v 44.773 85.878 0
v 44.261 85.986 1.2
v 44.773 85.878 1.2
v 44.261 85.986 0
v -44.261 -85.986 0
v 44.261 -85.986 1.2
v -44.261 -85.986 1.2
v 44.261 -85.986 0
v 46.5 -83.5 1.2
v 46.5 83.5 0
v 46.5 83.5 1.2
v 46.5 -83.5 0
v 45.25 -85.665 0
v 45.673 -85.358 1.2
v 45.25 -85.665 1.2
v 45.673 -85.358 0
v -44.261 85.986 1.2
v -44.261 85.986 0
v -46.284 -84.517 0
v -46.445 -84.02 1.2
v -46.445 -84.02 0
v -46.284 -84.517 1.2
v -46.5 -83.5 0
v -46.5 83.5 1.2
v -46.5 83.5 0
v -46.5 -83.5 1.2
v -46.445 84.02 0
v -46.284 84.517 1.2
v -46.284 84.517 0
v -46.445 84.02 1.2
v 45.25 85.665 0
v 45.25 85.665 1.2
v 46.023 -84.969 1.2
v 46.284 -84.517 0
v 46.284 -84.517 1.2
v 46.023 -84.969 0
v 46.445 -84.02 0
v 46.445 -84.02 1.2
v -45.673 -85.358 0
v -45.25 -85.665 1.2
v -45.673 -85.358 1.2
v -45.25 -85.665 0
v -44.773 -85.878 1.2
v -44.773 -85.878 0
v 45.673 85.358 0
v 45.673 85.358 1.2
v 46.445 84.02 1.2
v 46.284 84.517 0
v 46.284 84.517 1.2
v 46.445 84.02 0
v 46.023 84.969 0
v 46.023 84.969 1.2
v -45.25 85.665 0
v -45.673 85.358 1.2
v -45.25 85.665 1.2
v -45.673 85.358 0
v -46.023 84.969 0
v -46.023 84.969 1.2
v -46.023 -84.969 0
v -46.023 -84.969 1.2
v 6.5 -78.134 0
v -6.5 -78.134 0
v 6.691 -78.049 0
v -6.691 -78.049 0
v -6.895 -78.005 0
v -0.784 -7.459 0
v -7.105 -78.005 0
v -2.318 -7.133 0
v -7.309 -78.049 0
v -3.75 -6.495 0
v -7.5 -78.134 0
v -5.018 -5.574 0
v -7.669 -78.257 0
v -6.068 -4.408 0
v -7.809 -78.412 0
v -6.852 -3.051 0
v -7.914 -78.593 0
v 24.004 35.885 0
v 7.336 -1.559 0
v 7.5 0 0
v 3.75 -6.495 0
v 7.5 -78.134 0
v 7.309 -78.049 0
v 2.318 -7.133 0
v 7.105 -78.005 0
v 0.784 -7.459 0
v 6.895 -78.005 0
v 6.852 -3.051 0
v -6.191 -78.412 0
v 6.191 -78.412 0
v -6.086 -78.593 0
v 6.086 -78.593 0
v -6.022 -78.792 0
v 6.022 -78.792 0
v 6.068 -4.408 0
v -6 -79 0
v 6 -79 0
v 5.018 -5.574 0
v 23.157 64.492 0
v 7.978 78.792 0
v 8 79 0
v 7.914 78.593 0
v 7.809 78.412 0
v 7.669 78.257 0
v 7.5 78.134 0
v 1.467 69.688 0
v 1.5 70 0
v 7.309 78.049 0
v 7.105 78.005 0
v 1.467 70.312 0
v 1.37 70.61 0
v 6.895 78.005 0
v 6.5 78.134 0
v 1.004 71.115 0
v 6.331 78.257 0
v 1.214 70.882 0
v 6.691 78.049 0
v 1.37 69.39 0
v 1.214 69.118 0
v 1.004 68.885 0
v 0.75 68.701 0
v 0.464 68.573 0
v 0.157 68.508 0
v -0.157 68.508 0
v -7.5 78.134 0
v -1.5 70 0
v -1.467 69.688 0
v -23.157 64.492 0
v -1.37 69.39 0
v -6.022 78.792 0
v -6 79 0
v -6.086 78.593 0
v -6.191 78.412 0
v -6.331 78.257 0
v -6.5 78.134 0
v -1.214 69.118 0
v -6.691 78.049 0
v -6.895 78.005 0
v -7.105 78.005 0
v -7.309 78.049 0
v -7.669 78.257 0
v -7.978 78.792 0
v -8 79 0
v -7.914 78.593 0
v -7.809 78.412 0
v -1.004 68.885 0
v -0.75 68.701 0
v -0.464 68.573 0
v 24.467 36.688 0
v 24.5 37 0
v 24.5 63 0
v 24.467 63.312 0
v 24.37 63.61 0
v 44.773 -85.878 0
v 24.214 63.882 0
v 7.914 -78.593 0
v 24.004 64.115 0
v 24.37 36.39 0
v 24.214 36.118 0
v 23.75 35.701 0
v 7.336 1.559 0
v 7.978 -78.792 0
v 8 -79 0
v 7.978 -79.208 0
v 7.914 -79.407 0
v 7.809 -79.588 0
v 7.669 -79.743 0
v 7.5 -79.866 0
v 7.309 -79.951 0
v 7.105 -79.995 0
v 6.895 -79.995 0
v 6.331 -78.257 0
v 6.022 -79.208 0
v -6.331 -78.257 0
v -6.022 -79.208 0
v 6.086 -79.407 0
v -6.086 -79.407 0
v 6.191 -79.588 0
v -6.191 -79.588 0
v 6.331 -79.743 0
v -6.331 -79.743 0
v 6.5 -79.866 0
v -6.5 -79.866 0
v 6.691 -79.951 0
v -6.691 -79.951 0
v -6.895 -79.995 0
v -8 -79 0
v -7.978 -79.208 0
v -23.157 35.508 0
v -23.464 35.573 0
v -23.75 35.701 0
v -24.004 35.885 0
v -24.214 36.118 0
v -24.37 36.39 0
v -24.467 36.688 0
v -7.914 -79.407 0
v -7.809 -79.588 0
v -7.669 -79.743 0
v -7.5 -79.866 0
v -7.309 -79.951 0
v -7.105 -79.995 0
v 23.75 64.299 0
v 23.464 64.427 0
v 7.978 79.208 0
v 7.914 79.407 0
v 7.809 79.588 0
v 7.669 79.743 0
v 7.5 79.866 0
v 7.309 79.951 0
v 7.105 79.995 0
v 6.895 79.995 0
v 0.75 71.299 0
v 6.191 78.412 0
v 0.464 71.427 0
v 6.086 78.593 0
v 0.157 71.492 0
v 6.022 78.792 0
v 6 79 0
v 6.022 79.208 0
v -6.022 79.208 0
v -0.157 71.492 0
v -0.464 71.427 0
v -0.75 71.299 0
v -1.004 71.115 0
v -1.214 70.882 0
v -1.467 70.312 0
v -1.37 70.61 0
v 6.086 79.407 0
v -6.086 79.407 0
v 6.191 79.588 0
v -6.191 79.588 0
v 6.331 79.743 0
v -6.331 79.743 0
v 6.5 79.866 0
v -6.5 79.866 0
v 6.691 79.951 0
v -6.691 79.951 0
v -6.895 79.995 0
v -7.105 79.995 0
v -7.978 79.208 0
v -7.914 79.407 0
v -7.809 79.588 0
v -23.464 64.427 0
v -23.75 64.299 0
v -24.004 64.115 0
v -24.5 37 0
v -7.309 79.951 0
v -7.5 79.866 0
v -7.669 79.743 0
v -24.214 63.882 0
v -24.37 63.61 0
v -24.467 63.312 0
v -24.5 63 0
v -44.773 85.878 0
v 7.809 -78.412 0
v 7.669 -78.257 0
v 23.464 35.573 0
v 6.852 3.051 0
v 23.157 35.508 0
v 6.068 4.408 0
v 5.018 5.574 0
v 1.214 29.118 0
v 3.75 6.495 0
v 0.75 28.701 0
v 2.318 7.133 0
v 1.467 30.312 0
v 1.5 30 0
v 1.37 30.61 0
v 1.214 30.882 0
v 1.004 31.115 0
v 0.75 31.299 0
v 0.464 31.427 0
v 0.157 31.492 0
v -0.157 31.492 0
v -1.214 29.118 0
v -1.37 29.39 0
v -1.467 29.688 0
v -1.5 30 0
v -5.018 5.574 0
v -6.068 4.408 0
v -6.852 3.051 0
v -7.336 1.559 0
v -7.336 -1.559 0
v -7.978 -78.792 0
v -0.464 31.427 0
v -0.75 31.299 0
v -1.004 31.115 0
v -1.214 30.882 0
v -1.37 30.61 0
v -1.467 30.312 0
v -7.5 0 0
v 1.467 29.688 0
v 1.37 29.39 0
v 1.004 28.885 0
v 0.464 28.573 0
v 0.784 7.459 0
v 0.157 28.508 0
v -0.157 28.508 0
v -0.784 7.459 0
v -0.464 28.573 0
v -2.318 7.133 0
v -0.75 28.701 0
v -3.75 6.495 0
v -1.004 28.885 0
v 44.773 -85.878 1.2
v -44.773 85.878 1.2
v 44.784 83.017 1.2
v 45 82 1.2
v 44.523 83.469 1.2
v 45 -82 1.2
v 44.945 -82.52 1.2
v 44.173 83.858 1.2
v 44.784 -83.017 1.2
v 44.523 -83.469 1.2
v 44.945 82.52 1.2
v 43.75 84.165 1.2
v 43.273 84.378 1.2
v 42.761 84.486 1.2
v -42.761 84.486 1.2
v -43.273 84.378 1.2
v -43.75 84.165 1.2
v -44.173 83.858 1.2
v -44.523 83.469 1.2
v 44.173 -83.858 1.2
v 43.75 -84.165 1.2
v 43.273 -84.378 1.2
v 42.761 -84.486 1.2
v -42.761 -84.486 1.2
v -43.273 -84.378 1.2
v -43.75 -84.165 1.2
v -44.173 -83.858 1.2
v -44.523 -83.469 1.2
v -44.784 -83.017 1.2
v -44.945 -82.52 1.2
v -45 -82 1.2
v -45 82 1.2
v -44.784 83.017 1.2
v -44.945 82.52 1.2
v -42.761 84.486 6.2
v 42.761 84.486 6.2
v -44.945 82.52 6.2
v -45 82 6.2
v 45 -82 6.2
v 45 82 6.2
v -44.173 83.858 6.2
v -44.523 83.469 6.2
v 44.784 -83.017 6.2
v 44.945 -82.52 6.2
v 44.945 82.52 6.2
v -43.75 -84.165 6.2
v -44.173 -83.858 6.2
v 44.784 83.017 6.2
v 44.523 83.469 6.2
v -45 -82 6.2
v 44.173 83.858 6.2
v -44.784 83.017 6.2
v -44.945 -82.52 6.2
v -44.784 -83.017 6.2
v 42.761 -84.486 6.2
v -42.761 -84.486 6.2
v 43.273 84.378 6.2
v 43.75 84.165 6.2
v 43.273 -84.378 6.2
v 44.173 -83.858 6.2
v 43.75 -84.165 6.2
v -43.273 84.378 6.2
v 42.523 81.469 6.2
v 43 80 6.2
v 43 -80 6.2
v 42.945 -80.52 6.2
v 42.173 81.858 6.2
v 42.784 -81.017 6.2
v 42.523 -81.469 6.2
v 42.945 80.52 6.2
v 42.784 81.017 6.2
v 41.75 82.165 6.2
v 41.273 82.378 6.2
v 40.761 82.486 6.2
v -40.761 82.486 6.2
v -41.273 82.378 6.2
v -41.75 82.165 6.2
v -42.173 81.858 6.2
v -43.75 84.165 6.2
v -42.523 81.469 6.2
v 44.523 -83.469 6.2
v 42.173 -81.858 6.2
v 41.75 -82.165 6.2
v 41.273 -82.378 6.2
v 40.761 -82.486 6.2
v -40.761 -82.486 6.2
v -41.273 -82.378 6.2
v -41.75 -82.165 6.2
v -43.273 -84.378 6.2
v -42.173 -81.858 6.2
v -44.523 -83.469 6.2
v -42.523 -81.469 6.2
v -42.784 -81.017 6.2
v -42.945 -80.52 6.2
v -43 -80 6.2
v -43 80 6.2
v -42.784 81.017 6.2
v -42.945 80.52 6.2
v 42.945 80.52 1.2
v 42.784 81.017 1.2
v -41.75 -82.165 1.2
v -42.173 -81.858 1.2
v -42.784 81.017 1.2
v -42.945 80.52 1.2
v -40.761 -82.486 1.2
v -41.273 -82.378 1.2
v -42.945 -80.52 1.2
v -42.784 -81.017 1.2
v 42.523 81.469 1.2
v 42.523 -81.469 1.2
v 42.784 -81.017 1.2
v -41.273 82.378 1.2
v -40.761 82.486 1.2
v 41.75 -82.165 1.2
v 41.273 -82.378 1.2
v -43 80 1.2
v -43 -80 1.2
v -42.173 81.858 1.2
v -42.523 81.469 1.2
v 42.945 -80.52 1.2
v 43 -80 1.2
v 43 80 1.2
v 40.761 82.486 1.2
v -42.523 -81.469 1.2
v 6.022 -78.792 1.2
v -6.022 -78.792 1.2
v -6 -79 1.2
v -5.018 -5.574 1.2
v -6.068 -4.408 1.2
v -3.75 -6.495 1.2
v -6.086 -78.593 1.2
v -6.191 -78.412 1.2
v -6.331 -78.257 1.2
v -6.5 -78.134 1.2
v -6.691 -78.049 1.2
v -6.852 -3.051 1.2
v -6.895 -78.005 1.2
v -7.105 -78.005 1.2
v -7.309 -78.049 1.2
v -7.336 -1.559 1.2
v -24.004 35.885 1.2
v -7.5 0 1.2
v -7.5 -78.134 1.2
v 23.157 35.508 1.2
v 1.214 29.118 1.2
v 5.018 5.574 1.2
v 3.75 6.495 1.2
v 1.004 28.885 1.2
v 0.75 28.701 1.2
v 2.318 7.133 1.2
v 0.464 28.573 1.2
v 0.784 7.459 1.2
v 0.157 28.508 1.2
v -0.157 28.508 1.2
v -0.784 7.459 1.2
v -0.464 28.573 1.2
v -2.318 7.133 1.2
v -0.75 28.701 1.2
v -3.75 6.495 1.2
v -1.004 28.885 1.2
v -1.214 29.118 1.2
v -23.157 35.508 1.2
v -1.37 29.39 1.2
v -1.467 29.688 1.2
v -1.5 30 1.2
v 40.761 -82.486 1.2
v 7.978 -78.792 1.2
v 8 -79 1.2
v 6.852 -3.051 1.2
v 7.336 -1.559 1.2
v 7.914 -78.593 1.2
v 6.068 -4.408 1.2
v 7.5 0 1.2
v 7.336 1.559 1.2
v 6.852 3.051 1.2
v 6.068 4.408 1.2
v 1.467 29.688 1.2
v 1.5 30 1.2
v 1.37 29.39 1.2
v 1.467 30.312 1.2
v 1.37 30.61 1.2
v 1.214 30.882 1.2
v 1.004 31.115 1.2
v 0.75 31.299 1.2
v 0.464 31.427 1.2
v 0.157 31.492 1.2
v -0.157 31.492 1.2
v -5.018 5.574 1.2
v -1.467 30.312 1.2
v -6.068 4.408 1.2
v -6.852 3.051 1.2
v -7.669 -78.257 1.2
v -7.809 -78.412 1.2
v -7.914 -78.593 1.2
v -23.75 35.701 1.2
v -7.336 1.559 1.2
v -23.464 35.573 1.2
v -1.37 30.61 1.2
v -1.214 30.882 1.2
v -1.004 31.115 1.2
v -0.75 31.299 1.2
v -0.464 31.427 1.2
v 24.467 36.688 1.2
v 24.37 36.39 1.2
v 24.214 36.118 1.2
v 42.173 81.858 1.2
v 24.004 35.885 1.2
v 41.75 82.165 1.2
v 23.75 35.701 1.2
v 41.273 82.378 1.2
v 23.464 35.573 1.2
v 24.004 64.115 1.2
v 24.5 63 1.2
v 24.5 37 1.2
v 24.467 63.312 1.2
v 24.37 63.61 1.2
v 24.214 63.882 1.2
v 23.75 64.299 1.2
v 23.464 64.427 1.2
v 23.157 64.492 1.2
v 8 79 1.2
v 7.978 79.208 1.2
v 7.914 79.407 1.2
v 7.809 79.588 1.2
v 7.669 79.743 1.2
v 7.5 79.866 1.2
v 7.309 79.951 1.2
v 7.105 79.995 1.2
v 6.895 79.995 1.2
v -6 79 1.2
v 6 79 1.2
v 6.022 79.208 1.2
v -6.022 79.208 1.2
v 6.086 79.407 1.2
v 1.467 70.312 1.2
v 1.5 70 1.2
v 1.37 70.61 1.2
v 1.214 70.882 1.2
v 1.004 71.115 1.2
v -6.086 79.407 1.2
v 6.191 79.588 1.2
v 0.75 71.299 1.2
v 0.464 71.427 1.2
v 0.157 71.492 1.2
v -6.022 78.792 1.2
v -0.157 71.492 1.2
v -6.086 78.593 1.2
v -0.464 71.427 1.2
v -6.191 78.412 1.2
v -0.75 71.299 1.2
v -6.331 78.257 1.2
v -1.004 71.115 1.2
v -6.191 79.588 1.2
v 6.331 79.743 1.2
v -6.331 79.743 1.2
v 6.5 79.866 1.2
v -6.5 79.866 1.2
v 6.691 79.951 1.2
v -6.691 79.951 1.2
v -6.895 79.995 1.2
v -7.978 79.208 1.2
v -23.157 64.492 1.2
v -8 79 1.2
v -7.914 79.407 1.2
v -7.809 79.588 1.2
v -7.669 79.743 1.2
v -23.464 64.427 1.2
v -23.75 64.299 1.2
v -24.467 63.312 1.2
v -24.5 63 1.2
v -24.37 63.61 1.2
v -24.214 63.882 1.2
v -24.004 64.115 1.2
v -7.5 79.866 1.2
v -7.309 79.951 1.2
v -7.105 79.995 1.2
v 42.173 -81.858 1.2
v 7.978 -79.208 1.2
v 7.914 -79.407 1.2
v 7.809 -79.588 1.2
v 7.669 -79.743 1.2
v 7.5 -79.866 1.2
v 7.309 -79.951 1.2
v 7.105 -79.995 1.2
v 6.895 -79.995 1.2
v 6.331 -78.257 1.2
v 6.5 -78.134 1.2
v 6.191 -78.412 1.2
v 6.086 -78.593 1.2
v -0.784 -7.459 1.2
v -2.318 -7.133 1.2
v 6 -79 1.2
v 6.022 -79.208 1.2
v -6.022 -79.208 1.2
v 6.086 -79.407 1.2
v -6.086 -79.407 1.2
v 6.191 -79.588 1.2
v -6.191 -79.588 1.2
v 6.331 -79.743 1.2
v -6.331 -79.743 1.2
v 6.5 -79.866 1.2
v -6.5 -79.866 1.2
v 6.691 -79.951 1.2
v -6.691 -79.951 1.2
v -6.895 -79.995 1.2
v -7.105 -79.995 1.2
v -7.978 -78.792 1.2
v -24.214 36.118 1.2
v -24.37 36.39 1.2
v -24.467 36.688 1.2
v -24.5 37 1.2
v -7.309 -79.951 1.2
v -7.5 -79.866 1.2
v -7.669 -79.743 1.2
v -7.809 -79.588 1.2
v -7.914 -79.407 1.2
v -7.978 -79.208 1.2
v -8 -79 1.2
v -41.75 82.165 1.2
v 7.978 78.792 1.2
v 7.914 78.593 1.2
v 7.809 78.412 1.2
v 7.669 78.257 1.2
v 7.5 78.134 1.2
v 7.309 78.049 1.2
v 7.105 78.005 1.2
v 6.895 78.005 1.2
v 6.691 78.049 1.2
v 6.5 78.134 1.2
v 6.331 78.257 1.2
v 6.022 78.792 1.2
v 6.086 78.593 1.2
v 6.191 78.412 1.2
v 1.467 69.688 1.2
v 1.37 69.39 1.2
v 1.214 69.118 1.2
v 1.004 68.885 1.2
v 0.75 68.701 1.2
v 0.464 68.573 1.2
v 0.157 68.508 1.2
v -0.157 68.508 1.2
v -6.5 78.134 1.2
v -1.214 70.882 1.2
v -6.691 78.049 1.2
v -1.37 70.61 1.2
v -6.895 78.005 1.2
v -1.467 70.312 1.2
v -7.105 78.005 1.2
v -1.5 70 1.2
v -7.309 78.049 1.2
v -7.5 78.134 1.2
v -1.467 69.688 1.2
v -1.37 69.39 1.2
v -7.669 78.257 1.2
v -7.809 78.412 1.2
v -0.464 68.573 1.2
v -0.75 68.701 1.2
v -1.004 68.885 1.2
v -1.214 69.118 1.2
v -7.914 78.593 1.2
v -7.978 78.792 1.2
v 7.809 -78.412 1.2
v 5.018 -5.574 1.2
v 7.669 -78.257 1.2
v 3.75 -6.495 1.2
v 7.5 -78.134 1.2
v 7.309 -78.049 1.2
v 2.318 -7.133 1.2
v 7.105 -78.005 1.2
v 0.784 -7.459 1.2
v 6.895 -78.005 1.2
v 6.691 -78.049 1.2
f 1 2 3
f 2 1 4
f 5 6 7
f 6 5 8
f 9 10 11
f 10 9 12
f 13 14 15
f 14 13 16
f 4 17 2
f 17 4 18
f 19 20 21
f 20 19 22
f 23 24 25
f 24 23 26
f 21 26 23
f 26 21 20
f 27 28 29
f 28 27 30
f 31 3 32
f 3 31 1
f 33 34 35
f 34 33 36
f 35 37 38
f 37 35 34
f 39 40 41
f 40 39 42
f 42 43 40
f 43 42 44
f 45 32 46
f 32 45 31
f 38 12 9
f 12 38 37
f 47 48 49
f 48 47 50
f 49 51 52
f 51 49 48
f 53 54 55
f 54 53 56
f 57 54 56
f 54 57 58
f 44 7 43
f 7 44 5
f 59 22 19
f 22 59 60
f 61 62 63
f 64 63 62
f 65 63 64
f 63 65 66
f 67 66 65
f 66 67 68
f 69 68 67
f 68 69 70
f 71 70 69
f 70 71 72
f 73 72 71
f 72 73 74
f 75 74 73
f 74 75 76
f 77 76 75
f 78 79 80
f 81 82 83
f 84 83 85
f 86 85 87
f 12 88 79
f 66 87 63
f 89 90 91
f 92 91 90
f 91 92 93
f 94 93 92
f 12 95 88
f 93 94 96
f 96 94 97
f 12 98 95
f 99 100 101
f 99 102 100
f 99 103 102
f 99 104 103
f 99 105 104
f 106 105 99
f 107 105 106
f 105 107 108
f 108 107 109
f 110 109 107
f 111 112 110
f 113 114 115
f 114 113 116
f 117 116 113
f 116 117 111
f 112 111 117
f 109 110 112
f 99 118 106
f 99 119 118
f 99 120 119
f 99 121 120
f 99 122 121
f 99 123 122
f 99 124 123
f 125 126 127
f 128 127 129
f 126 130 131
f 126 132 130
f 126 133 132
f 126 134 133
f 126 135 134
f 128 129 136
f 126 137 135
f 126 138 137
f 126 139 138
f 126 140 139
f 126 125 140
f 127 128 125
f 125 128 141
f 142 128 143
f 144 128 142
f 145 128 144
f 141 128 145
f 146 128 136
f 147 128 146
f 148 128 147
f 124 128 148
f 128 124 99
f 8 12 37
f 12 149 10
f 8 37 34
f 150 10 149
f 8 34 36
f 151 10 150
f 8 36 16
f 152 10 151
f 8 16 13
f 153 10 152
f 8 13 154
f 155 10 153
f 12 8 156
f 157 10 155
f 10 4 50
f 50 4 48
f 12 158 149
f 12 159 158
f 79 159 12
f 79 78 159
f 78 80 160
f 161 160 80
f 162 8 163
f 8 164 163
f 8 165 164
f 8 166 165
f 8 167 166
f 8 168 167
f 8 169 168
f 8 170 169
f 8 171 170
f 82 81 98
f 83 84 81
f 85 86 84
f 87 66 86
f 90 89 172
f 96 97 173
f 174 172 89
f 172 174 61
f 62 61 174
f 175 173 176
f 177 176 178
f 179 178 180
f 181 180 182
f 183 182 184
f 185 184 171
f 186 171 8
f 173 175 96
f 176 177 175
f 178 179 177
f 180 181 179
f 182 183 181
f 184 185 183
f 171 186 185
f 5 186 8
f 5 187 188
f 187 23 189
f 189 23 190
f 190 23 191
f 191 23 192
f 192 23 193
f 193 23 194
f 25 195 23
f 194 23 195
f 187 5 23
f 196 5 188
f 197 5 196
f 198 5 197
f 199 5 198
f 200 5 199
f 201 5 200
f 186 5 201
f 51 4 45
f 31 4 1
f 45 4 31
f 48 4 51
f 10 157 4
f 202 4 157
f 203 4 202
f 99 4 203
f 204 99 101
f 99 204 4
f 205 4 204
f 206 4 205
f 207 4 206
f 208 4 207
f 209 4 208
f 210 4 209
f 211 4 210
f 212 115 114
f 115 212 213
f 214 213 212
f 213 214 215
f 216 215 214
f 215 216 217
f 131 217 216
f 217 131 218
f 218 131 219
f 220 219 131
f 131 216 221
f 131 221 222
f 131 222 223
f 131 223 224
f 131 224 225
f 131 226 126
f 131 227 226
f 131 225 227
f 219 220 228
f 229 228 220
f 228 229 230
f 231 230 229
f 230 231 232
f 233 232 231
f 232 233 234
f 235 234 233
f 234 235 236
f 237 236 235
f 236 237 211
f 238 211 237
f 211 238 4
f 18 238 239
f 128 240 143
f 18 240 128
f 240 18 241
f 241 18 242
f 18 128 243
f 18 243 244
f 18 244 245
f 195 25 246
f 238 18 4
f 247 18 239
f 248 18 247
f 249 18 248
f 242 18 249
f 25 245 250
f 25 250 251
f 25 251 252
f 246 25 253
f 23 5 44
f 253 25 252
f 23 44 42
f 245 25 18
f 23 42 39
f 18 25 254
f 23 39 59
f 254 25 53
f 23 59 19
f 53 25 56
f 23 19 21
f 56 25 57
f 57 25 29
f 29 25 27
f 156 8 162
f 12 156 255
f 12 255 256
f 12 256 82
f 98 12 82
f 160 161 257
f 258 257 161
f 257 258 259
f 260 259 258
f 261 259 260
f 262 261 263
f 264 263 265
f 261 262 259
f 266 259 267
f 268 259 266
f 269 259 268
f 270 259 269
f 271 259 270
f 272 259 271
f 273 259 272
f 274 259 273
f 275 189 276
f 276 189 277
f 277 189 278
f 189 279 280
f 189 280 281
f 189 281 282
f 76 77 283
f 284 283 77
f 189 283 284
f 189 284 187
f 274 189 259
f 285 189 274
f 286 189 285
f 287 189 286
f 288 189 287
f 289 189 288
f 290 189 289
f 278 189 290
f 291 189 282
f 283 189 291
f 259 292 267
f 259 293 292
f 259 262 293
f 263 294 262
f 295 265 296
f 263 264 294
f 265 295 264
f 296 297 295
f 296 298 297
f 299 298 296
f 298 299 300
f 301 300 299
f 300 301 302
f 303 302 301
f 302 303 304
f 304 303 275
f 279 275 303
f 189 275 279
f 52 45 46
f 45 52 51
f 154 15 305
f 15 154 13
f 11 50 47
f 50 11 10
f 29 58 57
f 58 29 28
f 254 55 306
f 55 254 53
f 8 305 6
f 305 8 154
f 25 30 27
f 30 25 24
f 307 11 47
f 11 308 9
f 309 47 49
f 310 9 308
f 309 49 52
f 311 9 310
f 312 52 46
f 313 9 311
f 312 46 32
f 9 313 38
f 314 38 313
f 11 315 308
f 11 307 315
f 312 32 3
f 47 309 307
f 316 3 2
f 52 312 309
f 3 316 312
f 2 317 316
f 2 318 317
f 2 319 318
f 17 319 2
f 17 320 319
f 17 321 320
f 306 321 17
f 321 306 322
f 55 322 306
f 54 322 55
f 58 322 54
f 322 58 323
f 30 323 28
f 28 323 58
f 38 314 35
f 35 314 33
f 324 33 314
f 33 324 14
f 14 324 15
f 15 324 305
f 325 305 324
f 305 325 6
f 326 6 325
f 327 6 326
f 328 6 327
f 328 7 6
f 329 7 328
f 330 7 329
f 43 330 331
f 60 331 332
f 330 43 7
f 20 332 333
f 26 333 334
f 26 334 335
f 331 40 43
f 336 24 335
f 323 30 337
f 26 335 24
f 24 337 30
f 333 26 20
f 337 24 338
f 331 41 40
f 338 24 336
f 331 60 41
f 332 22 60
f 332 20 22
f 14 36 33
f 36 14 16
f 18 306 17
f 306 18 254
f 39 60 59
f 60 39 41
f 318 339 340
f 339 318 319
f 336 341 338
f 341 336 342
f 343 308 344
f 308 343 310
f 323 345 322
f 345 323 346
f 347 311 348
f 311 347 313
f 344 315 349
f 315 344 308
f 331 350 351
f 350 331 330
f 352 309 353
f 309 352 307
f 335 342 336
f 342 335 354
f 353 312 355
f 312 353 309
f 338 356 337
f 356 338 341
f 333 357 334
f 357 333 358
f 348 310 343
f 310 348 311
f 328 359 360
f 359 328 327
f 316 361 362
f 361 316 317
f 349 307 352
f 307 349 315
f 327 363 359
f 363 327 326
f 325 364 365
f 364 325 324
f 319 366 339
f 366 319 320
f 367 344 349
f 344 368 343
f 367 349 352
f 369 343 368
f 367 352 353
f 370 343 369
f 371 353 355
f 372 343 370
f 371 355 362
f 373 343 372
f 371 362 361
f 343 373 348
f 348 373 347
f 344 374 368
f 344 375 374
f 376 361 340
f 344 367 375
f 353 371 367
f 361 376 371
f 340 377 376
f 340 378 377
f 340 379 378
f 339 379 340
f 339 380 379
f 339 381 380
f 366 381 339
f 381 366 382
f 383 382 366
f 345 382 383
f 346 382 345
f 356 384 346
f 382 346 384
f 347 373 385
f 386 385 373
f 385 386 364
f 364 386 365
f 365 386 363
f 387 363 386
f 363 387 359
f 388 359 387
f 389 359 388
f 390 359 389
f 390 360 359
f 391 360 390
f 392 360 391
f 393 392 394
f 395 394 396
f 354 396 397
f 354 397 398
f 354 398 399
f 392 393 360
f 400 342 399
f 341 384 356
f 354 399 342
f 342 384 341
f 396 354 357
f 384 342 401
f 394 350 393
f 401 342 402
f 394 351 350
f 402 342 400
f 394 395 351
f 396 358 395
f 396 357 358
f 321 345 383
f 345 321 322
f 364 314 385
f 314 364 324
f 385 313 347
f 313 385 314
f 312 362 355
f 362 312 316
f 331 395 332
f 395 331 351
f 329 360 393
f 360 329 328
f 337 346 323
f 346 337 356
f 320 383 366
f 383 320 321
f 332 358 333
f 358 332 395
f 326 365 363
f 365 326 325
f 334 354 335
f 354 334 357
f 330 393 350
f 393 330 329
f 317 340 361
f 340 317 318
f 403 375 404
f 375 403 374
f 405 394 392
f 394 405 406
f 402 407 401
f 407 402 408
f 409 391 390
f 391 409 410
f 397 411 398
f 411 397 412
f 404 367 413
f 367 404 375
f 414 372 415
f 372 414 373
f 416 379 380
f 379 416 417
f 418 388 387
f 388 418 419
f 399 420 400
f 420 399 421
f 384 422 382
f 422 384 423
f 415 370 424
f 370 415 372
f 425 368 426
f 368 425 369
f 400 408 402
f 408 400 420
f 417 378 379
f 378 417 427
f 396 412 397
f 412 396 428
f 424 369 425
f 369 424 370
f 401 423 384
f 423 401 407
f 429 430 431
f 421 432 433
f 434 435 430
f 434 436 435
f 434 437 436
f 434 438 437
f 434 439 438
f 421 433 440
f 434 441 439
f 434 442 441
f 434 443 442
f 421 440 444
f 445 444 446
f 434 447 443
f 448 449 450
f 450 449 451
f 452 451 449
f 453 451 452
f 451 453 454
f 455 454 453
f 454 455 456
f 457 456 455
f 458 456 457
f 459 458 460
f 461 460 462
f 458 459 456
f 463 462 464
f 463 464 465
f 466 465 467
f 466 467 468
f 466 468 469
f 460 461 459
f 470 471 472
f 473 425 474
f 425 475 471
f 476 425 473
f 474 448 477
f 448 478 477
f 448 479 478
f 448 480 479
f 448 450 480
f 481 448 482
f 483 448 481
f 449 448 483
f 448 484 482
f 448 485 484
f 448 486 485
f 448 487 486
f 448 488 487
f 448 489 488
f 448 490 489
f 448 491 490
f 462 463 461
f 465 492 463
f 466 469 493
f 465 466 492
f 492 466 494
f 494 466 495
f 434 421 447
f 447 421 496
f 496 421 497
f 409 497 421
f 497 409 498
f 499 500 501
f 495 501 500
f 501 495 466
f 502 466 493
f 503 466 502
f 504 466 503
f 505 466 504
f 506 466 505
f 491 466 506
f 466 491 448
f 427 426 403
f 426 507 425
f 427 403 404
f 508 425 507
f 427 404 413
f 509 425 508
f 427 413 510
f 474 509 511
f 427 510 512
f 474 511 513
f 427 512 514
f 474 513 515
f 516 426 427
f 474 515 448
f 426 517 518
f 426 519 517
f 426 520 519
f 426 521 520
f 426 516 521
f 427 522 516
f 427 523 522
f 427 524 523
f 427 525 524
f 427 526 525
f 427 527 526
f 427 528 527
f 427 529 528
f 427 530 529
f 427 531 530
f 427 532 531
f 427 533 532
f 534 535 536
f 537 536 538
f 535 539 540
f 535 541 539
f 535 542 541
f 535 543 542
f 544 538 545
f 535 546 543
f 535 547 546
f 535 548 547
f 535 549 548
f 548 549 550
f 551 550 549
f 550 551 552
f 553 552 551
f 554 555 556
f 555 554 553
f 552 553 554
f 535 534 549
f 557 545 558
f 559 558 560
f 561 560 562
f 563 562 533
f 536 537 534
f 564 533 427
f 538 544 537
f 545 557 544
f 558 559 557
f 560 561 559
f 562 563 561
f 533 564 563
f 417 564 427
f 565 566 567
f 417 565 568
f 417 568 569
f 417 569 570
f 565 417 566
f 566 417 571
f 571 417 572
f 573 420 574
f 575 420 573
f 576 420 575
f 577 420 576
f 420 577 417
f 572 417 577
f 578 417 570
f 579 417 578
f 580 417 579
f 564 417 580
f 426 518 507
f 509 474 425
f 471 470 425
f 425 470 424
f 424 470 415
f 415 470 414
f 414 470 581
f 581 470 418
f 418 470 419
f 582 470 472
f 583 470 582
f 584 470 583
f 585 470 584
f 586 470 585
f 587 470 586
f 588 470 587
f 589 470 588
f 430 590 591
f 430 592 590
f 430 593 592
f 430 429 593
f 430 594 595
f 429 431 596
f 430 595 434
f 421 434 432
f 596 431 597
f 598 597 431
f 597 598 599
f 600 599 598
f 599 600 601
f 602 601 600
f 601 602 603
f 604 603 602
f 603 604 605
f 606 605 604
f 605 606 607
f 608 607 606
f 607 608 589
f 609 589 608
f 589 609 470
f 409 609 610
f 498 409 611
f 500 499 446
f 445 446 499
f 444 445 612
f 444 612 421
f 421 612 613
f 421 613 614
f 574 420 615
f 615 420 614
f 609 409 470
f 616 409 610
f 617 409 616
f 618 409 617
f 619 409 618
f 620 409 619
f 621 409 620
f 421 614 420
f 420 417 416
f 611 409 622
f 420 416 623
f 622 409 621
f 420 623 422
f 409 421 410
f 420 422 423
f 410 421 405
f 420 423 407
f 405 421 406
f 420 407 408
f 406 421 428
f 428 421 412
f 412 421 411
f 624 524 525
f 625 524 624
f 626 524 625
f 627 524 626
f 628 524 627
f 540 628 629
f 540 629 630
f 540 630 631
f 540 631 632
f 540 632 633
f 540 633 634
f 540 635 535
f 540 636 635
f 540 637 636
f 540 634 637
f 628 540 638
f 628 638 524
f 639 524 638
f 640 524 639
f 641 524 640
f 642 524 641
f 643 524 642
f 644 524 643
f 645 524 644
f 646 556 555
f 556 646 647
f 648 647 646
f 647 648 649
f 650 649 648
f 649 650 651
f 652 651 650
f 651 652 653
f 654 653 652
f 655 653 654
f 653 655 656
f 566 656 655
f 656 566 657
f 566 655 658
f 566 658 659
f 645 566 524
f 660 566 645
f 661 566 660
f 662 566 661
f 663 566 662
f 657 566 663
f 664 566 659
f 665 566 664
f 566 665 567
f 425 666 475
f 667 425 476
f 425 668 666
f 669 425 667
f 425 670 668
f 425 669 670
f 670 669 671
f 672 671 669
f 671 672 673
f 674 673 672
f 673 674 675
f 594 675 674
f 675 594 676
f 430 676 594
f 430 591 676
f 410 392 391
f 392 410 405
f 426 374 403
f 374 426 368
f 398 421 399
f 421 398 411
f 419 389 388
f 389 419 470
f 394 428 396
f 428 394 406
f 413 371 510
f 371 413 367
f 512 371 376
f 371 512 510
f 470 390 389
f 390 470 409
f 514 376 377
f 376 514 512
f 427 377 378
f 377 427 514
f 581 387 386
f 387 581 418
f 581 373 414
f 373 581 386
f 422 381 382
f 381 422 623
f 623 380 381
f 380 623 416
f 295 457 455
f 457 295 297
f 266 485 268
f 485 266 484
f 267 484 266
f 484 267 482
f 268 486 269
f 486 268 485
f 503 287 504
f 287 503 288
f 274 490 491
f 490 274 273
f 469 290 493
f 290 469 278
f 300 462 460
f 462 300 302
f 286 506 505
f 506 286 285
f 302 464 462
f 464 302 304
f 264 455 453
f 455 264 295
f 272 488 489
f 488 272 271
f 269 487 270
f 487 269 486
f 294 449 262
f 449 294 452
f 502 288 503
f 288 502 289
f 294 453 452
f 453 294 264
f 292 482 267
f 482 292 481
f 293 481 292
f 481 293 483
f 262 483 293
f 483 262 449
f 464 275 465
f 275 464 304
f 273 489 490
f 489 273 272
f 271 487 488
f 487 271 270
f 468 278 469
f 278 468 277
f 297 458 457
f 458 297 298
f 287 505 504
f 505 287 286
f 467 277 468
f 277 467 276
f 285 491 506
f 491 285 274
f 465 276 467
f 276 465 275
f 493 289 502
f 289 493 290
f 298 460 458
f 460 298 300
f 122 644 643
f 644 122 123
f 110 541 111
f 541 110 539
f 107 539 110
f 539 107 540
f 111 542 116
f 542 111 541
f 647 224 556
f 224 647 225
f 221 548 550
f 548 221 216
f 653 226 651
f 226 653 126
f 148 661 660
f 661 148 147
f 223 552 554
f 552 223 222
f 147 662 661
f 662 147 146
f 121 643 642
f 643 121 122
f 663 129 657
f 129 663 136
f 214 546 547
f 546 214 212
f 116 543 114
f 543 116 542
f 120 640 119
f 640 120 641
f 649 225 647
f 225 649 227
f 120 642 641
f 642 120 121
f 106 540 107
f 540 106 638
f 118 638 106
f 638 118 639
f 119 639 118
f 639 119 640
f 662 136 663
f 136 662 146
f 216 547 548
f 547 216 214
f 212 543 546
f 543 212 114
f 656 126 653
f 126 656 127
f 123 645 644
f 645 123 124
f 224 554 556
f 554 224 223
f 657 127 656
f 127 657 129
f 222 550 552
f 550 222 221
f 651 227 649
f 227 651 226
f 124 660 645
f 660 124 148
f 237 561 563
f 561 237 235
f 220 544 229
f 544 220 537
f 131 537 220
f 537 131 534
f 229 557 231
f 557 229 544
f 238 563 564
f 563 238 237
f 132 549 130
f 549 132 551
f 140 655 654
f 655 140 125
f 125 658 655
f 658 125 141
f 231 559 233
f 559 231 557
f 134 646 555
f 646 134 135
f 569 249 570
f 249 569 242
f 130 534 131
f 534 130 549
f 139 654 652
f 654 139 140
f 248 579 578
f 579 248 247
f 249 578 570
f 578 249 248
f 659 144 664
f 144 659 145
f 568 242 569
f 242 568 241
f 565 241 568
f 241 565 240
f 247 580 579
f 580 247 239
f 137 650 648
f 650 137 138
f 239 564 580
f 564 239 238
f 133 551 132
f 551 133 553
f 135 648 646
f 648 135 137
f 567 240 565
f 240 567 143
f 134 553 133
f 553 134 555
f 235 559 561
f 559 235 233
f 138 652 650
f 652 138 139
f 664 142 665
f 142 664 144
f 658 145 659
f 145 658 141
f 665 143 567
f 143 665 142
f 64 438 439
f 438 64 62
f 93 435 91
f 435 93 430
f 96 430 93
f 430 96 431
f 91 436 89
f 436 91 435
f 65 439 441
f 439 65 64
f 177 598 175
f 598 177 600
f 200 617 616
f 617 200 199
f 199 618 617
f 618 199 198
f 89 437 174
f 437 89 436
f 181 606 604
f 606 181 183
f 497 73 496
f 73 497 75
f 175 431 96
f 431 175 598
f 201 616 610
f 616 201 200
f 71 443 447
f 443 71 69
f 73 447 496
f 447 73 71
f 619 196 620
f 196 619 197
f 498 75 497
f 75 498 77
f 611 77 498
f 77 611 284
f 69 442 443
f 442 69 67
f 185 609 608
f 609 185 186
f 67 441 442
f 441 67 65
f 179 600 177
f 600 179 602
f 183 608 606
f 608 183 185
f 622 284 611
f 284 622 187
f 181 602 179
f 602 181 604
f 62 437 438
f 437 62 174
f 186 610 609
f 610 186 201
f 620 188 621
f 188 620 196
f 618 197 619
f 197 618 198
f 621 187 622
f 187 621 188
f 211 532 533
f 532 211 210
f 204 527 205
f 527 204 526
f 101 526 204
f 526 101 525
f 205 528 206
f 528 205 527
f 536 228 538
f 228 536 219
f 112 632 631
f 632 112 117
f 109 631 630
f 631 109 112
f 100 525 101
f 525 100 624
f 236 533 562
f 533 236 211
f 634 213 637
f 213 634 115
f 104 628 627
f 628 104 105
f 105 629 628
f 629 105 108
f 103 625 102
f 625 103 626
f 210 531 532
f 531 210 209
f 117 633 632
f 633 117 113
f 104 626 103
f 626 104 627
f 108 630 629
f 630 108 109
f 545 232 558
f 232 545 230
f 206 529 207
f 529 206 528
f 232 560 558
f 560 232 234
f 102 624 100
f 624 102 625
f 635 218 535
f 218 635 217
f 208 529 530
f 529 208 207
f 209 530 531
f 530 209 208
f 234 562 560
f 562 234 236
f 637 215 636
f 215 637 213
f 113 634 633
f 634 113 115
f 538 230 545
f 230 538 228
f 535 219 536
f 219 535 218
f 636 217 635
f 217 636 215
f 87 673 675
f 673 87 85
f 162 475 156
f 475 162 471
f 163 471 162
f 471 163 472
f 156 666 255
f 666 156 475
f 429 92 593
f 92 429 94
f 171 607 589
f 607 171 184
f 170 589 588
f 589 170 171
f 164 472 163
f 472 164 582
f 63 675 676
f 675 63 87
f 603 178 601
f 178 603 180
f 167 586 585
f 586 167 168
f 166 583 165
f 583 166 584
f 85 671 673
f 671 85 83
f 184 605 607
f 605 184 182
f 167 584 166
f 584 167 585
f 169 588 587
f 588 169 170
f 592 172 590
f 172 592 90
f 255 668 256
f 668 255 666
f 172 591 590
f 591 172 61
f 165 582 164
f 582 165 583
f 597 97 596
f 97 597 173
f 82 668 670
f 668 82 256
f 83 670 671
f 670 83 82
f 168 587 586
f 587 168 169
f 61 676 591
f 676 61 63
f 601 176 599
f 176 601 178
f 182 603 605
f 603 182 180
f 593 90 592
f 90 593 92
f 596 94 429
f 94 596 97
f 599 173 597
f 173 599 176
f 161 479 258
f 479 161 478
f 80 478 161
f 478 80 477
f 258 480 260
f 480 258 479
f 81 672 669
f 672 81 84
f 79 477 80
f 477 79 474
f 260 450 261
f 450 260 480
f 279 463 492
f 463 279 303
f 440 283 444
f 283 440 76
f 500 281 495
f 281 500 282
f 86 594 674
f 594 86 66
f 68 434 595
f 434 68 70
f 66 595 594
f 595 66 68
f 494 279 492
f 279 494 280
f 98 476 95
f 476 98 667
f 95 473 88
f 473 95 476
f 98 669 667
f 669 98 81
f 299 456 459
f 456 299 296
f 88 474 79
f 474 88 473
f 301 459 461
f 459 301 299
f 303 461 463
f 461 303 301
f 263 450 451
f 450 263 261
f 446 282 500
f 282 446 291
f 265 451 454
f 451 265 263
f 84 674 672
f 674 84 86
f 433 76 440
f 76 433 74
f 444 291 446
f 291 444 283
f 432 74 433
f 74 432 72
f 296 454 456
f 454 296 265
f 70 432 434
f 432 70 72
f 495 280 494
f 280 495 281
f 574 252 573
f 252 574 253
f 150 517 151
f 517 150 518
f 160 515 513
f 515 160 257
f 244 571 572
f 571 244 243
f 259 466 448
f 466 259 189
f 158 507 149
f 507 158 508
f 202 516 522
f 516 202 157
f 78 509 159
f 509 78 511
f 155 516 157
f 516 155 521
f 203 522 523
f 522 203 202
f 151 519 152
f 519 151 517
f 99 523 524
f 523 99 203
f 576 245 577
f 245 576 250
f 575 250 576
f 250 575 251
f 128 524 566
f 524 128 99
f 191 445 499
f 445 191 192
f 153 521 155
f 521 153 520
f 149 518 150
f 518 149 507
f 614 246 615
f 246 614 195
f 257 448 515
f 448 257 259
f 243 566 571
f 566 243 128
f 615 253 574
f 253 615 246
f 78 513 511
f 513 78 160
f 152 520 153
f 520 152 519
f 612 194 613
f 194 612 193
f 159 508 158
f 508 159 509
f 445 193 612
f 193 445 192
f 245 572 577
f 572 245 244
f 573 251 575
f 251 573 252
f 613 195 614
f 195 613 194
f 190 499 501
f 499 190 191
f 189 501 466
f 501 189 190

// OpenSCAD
WIDTH = 93;
LENGTH = 172;
CORNER_DIA = 5;

FRONT_THICKNESS = 1.2;
WALL_THICKNESS = 1.5;

LIP_THICKNESS = 2;
LIP_HEIGHT = 5;

POWER_WIDTH = 49;
POWER_LENGTH = 29;
POWER_OFFSET_Y = 50;

POWER_HOLE_SPACING_Y = 40;
POWER_HOLE_DIA = 3;
POWER_CORNER_DIA = 3;

GROMMET_DIA = 15;
GROMMET_OFFSET_Y = 0;

PID_WIDTH = 45;
PID_LENGTH = 45;
PID_OFFSET_Y = -40;
PID_CORNER_DIA = 2;

BUTTON_DIA = 22;
BUTTON_OFFSET_Y = 40;

MOUNT_HEIGHT = 16;
MOUNT_WIDTH = 22;
MOUNT_LENGTH = 10;
MOUNT_HOLE_SPACING_X = 14;
MOUNT_HOLE_SPACING_Y = 13;
MOUNT_HOLE_SPACING_X_2 = MOUNT_HOLE_SPACING_X;
MOUNT_HOLE_SPACING_Y_2 = LENGTH - 2 * LIP_THICKNESS - MOUNT_LENGTH;
MOUNT_HOLE_DIA = 2;
MOUNT_HOLE_SLOT = 2;

$fn = 30;

module rounded_rect(width, length, height, corner_dia) {
  hull() {
    for(i = [-1, 1]) {
        for (j = [-1, 1]) {
            translate([i*(width-corner_dia)/2, j*(length-corner_dia)/2, 0])
            cylinder(d = corner_dia, h = height);
        }
    }
  }
}

module empty_side() {
  difference() {
    wt2 = 2 * WALL_THICKNESS;
    union() {
        rounded_rect(WIDTH, LENGTH, FRONT_THICKNESS, CORNER_DIA);
        translate([0, 0, FRONT_THICKNESS])
        rounded_rect(WIDTH - wt2, LENGTH - wt2, LIP_HEIGHT, CORNER_DIA);
    }

    lt2 = 2 * LIP_THICKNESS;
    translate([0, 0, FRONT_THICKNESS])
    rounded_rect(WIDTH - wt2 - lt2, LENGTH - wt2 - lt2, LIP_HEIGHT, CORNER_DIA);
  }
}

module front_side() {
  difference() {
    empty_side();

    translate([0, BUTTON_OFFSET_Y, 0])
    cylinder(d = BUTTON_DIA, h = FRONT_THICKNESS);

    translate([0, PID_OFFSET_Y, 0])
    rounded_rect(PID_WIDTH, PID_LENGTH, FRONT_THICKNESS, PID_CORNER_DIA);

    mount_holes();
  }
}

module back_side() {
  difference() {
    empty_side();

    translate([0, GROMMET_OFFSET_Y, 0])
    cylinder(d = GROMMET_DIA, h = FRONT_THICKNESS);

    translate([0, POWER_OFFSET_Y, 0])
    rounded_rect(POWER_WIDTH, POWER_LENGTH, FRONT_THICKNESS, POWER_CORNER_DIA);

    for(i = [-1, 1]) {
        translate([0, POWER_OFFSET_Y + i * POWER_HOLE_SPACING_Y/2, 0])
        cylinder(d = POWER_HOLE_DIA, h = FRONT_THICKNESS);
    }

    mount_holes();
  }
}

module mount_holes() {
  #for(i = [-1, 1]) {
      translate([i*MOUNT_HOLE_SPACING_X/2, 0, MOUNT_HOLE_SPACING_Y])
      rotate([90, 0, 0])
      cylinder(d = MOUNT_HOLE_DIA, h = LENGTH, center = true);
  }

  #for(i = [-1, 1]) {
      translate([i*MOUNT_HOLE_SPACING_X_2/2, MOUNT_HOLE_SPACING_Y_2/2, 0])
      cylinder(d = MOUNT_HOLE_DIA, h = MOUNT_HEIGHT, center = true);

      translate([i*MOUNT_HOLE_SPACING_X_2/2, -MOUNT_HOLE_SPACING_Y_2/2, 0])
      cylinder(d = MOUNT_HOLE_DIA, h = MOUNT_HEIGHT, center = true);
  }
}

module mount() {
  intersection() {
    difference() {
      wt2 = 2 * WALL_THICKNESS;
      rounded_rect(MOUNT_WIDTH, LENGTH - wt2, MOUNT_HEIGHT, 1);
      rounded_rect(2 * MOUNT_WIDTH, LENGTH - 2 * MOUNT_LENGTH, MOUNT_HEIGHT, CORNER_DIA);

      mount_holes();
      translate([-MOUNT_HOLE_SLOT/2, 0, 0])
      mount_holes();
      translate([MOUNT_HOLE_SLOT/2, 0, 0])
      mount_holes();
      empty_side();
    }
    translate([-WIDTH/2, 0, 0])
    cube([WIDTH, LENGTH, MOUNT_HEIGHT]);
  }
}


mount();
front_side();
!back_side();
